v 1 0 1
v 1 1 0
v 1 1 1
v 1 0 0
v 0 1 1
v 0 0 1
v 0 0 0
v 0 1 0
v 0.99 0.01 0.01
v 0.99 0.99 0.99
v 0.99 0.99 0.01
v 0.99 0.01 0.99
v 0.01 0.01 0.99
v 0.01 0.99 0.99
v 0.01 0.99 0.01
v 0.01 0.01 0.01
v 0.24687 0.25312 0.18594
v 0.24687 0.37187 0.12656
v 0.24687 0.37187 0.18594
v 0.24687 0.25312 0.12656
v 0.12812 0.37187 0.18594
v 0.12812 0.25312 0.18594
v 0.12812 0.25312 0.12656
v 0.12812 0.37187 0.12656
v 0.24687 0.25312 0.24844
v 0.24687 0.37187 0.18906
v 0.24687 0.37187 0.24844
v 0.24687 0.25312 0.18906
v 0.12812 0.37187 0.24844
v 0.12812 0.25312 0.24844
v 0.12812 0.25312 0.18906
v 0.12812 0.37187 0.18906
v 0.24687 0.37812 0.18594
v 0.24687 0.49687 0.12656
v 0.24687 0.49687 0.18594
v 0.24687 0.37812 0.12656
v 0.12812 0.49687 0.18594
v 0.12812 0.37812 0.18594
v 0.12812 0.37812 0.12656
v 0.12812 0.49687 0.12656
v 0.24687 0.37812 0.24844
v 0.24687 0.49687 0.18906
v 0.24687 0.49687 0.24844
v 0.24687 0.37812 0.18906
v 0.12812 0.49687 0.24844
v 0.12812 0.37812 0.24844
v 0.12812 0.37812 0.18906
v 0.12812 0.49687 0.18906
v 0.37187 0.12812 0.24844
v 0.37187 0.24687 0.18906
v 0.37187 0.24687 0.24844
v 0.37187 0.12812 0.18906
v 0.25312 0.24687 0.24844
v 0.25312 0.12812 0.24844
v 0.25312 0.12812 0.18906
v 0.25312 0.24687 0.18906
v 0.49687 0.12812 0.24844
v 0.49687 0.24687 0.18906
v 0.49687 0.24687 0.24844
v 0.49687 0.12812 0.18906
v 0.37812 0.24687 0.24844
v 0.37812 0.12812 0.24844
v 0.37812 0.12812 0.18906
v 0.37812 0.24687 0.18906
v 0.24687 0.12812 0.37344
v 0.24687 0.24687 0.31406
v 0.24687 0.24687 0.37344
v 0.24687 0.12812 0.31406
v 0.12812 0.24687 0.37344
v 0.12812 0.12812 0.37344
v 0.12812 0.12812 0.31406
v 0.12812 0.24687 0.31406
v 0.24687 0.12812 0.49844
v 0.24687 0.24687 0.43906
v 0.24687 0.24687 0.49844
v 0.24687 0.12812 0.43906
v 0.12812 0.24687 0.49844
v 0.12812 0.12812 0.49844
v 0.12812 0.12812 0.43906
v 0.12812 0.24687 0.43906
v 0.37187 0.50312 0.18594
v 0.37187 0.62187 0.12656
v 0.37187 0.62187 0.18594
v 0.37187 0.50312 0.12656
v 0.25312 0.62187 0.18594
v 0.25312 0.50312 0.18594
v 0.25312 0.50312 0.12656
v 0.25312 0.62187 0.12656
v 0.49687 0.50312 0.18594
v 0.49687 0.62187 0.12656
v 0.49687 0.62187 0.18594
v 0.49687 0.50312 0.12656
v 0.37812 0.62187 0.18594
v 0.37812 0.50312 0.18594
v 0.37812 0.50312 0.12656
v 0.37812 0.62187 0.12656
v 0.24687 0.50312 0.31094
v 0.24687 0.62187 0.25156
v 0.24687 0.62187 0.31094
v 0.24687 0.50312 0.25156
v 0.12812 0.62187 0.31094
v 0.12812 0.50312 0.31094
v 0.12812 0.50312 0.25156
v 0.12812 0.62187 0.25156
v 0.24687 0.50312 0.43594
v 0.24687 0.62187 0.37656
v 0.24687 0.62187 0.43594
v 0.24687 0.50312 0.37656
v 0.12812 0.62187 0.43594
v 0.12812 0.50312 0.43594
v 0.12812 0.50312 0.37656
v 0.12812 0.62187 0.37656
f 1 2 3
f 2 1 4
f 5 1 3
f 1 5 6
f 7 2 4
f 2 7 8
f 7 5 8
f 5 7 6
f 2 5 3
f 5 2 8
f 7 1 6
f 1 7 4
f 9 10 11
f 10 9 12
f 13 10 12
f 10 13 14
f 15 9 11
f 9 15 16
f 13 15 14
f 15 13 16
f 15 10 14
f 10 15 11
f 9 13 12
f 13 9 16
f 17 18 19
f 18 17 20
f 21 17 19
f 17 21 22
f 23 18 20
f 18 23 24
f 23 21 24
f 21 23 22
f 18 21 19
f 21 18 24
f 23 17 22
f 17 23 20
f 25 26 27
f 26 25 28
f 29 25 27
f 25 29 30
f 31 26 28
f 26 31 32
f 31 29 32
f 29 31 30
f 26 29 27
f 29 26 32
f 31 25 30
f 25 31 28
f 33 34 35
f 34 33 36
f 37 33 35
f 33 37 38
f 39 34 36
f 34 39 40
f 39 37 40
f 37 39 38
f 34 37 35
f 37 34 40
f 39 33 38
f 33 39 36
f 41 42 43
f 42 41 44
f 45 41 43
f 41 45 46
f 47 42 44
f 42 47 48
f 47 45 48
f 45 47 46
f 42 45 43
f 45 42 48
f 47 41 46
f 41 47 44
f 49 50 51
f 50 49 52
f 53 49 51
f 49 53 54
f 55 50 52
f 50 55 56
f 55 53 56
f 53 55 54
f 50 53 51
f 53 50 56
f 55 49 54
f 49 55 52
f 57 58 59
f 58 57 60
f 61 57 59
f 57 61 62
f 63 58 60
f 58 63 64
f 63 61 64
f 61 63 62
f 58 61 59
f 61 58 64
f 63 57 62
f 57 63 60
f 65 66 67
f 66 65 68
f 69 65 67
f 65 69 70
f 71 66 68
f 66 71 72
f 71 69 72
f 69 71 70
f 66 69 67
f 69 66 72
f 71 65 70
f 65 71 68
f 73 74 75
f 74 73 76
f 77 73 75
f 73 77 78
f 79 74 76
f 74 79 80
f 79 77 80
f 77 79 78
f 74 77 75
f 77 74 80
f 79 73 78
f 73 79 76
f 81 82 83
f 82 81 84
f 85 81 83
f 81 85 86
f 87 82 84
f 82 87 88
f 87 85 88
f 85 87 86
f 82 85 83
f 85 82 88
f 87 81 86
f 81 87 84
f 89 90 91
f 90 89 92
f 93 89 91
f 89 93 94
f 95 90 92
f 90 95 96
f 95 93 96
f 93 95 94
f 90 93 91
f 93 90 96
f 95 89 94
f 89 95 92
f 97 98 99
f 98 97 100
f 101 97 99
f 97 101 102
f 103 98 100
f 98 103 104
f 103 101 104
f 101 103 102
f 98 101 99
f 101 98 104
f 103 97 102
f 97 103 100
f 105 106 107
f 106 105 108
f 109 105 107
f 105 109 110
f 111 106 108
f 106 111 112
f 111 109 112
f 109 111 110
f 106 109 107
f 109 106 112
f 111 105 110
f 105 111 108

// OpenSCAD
translate([0.1875, 0.3125, 0.15625]) color([0.6780893207968227, 0.08337096158279222, 0.27725115680544954]) cube([0.11875, 0.11875, 0.059375], center=true);
translate([0.1875, 0.3125, 0.21875]) color([0.9965791662073833, 0.03375154870506614, 0.10494976972159242]) cube([0.11875, 0.11875, 0.059375], center=true);
translate([0.1875, 0.4375, 0.15625]) color([0.516844917539197, 0.1360610465034362, 0.543805910213663]) cube([0.11875, 0.11875, 0.059375], center=true);
translate([0.1875, 0.4375, 0.21875]) color([0.04901628196141694, 0.4867102513994055, 0.8813892002857401]) cube([0.11875, 0.11875, 0.059375], center=true);
translate([0.3125, 0.1875, 0.21875]) color([0.3053751014353143, 0.40772022041766365, 0.31297204198076634]) cube([0.11875, 0.11875, 0.059375], center=true);
translate([0.4375, 0.1875, 0.21875]) color([0.49907796034366436, 0.6160709555012981, 0.9916538905911245]) cube([0.11875, 0.11875, 0.059375], center=true);
translate([0.1875, 0.1875, 0.34375]) color([0.3123575451593331, 0.46364206475662195, 0.8862899719975306]) cube([0.11875, 0.11875, 0.059375], center=true);
translate([0.1875, 0.1875, 0.46875]) color([0.5738800220993816, 0.8494037217359881, 0.24323676398212035]) cube([0.11875, 0.11875, 0.059375], center=true);
translate([0.3125, 0.5625, 0.15625]) color([0.8402878098664139, 0.9530478541805099, 0.16594803365564914]) cube([0.11875, 0.11875, 0.059375], center=true);
translate([0.4375, 0.5625, 0.15625]) color([0.0023370868964924796, 0.7387895340607371, 0.5374530602666081]) cube([0.11875, 0.11875, 0.059375], center=true);
translate([0.1875, 0.5625, 0.28125]) color([0.25604025835089217, 0.4320068924153808, 0.5112453323210508]) cube([0.11875, 0.11875, 0.059375], center=true);
translate([0.1875, 0.5625, 0.40625]) color([0.7462272619347637, 0.5039790716190428, 0.8850839351693509]) cube([0.11875, 0.11875, 0.059375], center=true);
color([0.3,0.3,0.3,0.3]) difference() { cube([1,1,1]); translate([0.01,0.01,0.01]) cube([0.98,0.98,0.98]); }
